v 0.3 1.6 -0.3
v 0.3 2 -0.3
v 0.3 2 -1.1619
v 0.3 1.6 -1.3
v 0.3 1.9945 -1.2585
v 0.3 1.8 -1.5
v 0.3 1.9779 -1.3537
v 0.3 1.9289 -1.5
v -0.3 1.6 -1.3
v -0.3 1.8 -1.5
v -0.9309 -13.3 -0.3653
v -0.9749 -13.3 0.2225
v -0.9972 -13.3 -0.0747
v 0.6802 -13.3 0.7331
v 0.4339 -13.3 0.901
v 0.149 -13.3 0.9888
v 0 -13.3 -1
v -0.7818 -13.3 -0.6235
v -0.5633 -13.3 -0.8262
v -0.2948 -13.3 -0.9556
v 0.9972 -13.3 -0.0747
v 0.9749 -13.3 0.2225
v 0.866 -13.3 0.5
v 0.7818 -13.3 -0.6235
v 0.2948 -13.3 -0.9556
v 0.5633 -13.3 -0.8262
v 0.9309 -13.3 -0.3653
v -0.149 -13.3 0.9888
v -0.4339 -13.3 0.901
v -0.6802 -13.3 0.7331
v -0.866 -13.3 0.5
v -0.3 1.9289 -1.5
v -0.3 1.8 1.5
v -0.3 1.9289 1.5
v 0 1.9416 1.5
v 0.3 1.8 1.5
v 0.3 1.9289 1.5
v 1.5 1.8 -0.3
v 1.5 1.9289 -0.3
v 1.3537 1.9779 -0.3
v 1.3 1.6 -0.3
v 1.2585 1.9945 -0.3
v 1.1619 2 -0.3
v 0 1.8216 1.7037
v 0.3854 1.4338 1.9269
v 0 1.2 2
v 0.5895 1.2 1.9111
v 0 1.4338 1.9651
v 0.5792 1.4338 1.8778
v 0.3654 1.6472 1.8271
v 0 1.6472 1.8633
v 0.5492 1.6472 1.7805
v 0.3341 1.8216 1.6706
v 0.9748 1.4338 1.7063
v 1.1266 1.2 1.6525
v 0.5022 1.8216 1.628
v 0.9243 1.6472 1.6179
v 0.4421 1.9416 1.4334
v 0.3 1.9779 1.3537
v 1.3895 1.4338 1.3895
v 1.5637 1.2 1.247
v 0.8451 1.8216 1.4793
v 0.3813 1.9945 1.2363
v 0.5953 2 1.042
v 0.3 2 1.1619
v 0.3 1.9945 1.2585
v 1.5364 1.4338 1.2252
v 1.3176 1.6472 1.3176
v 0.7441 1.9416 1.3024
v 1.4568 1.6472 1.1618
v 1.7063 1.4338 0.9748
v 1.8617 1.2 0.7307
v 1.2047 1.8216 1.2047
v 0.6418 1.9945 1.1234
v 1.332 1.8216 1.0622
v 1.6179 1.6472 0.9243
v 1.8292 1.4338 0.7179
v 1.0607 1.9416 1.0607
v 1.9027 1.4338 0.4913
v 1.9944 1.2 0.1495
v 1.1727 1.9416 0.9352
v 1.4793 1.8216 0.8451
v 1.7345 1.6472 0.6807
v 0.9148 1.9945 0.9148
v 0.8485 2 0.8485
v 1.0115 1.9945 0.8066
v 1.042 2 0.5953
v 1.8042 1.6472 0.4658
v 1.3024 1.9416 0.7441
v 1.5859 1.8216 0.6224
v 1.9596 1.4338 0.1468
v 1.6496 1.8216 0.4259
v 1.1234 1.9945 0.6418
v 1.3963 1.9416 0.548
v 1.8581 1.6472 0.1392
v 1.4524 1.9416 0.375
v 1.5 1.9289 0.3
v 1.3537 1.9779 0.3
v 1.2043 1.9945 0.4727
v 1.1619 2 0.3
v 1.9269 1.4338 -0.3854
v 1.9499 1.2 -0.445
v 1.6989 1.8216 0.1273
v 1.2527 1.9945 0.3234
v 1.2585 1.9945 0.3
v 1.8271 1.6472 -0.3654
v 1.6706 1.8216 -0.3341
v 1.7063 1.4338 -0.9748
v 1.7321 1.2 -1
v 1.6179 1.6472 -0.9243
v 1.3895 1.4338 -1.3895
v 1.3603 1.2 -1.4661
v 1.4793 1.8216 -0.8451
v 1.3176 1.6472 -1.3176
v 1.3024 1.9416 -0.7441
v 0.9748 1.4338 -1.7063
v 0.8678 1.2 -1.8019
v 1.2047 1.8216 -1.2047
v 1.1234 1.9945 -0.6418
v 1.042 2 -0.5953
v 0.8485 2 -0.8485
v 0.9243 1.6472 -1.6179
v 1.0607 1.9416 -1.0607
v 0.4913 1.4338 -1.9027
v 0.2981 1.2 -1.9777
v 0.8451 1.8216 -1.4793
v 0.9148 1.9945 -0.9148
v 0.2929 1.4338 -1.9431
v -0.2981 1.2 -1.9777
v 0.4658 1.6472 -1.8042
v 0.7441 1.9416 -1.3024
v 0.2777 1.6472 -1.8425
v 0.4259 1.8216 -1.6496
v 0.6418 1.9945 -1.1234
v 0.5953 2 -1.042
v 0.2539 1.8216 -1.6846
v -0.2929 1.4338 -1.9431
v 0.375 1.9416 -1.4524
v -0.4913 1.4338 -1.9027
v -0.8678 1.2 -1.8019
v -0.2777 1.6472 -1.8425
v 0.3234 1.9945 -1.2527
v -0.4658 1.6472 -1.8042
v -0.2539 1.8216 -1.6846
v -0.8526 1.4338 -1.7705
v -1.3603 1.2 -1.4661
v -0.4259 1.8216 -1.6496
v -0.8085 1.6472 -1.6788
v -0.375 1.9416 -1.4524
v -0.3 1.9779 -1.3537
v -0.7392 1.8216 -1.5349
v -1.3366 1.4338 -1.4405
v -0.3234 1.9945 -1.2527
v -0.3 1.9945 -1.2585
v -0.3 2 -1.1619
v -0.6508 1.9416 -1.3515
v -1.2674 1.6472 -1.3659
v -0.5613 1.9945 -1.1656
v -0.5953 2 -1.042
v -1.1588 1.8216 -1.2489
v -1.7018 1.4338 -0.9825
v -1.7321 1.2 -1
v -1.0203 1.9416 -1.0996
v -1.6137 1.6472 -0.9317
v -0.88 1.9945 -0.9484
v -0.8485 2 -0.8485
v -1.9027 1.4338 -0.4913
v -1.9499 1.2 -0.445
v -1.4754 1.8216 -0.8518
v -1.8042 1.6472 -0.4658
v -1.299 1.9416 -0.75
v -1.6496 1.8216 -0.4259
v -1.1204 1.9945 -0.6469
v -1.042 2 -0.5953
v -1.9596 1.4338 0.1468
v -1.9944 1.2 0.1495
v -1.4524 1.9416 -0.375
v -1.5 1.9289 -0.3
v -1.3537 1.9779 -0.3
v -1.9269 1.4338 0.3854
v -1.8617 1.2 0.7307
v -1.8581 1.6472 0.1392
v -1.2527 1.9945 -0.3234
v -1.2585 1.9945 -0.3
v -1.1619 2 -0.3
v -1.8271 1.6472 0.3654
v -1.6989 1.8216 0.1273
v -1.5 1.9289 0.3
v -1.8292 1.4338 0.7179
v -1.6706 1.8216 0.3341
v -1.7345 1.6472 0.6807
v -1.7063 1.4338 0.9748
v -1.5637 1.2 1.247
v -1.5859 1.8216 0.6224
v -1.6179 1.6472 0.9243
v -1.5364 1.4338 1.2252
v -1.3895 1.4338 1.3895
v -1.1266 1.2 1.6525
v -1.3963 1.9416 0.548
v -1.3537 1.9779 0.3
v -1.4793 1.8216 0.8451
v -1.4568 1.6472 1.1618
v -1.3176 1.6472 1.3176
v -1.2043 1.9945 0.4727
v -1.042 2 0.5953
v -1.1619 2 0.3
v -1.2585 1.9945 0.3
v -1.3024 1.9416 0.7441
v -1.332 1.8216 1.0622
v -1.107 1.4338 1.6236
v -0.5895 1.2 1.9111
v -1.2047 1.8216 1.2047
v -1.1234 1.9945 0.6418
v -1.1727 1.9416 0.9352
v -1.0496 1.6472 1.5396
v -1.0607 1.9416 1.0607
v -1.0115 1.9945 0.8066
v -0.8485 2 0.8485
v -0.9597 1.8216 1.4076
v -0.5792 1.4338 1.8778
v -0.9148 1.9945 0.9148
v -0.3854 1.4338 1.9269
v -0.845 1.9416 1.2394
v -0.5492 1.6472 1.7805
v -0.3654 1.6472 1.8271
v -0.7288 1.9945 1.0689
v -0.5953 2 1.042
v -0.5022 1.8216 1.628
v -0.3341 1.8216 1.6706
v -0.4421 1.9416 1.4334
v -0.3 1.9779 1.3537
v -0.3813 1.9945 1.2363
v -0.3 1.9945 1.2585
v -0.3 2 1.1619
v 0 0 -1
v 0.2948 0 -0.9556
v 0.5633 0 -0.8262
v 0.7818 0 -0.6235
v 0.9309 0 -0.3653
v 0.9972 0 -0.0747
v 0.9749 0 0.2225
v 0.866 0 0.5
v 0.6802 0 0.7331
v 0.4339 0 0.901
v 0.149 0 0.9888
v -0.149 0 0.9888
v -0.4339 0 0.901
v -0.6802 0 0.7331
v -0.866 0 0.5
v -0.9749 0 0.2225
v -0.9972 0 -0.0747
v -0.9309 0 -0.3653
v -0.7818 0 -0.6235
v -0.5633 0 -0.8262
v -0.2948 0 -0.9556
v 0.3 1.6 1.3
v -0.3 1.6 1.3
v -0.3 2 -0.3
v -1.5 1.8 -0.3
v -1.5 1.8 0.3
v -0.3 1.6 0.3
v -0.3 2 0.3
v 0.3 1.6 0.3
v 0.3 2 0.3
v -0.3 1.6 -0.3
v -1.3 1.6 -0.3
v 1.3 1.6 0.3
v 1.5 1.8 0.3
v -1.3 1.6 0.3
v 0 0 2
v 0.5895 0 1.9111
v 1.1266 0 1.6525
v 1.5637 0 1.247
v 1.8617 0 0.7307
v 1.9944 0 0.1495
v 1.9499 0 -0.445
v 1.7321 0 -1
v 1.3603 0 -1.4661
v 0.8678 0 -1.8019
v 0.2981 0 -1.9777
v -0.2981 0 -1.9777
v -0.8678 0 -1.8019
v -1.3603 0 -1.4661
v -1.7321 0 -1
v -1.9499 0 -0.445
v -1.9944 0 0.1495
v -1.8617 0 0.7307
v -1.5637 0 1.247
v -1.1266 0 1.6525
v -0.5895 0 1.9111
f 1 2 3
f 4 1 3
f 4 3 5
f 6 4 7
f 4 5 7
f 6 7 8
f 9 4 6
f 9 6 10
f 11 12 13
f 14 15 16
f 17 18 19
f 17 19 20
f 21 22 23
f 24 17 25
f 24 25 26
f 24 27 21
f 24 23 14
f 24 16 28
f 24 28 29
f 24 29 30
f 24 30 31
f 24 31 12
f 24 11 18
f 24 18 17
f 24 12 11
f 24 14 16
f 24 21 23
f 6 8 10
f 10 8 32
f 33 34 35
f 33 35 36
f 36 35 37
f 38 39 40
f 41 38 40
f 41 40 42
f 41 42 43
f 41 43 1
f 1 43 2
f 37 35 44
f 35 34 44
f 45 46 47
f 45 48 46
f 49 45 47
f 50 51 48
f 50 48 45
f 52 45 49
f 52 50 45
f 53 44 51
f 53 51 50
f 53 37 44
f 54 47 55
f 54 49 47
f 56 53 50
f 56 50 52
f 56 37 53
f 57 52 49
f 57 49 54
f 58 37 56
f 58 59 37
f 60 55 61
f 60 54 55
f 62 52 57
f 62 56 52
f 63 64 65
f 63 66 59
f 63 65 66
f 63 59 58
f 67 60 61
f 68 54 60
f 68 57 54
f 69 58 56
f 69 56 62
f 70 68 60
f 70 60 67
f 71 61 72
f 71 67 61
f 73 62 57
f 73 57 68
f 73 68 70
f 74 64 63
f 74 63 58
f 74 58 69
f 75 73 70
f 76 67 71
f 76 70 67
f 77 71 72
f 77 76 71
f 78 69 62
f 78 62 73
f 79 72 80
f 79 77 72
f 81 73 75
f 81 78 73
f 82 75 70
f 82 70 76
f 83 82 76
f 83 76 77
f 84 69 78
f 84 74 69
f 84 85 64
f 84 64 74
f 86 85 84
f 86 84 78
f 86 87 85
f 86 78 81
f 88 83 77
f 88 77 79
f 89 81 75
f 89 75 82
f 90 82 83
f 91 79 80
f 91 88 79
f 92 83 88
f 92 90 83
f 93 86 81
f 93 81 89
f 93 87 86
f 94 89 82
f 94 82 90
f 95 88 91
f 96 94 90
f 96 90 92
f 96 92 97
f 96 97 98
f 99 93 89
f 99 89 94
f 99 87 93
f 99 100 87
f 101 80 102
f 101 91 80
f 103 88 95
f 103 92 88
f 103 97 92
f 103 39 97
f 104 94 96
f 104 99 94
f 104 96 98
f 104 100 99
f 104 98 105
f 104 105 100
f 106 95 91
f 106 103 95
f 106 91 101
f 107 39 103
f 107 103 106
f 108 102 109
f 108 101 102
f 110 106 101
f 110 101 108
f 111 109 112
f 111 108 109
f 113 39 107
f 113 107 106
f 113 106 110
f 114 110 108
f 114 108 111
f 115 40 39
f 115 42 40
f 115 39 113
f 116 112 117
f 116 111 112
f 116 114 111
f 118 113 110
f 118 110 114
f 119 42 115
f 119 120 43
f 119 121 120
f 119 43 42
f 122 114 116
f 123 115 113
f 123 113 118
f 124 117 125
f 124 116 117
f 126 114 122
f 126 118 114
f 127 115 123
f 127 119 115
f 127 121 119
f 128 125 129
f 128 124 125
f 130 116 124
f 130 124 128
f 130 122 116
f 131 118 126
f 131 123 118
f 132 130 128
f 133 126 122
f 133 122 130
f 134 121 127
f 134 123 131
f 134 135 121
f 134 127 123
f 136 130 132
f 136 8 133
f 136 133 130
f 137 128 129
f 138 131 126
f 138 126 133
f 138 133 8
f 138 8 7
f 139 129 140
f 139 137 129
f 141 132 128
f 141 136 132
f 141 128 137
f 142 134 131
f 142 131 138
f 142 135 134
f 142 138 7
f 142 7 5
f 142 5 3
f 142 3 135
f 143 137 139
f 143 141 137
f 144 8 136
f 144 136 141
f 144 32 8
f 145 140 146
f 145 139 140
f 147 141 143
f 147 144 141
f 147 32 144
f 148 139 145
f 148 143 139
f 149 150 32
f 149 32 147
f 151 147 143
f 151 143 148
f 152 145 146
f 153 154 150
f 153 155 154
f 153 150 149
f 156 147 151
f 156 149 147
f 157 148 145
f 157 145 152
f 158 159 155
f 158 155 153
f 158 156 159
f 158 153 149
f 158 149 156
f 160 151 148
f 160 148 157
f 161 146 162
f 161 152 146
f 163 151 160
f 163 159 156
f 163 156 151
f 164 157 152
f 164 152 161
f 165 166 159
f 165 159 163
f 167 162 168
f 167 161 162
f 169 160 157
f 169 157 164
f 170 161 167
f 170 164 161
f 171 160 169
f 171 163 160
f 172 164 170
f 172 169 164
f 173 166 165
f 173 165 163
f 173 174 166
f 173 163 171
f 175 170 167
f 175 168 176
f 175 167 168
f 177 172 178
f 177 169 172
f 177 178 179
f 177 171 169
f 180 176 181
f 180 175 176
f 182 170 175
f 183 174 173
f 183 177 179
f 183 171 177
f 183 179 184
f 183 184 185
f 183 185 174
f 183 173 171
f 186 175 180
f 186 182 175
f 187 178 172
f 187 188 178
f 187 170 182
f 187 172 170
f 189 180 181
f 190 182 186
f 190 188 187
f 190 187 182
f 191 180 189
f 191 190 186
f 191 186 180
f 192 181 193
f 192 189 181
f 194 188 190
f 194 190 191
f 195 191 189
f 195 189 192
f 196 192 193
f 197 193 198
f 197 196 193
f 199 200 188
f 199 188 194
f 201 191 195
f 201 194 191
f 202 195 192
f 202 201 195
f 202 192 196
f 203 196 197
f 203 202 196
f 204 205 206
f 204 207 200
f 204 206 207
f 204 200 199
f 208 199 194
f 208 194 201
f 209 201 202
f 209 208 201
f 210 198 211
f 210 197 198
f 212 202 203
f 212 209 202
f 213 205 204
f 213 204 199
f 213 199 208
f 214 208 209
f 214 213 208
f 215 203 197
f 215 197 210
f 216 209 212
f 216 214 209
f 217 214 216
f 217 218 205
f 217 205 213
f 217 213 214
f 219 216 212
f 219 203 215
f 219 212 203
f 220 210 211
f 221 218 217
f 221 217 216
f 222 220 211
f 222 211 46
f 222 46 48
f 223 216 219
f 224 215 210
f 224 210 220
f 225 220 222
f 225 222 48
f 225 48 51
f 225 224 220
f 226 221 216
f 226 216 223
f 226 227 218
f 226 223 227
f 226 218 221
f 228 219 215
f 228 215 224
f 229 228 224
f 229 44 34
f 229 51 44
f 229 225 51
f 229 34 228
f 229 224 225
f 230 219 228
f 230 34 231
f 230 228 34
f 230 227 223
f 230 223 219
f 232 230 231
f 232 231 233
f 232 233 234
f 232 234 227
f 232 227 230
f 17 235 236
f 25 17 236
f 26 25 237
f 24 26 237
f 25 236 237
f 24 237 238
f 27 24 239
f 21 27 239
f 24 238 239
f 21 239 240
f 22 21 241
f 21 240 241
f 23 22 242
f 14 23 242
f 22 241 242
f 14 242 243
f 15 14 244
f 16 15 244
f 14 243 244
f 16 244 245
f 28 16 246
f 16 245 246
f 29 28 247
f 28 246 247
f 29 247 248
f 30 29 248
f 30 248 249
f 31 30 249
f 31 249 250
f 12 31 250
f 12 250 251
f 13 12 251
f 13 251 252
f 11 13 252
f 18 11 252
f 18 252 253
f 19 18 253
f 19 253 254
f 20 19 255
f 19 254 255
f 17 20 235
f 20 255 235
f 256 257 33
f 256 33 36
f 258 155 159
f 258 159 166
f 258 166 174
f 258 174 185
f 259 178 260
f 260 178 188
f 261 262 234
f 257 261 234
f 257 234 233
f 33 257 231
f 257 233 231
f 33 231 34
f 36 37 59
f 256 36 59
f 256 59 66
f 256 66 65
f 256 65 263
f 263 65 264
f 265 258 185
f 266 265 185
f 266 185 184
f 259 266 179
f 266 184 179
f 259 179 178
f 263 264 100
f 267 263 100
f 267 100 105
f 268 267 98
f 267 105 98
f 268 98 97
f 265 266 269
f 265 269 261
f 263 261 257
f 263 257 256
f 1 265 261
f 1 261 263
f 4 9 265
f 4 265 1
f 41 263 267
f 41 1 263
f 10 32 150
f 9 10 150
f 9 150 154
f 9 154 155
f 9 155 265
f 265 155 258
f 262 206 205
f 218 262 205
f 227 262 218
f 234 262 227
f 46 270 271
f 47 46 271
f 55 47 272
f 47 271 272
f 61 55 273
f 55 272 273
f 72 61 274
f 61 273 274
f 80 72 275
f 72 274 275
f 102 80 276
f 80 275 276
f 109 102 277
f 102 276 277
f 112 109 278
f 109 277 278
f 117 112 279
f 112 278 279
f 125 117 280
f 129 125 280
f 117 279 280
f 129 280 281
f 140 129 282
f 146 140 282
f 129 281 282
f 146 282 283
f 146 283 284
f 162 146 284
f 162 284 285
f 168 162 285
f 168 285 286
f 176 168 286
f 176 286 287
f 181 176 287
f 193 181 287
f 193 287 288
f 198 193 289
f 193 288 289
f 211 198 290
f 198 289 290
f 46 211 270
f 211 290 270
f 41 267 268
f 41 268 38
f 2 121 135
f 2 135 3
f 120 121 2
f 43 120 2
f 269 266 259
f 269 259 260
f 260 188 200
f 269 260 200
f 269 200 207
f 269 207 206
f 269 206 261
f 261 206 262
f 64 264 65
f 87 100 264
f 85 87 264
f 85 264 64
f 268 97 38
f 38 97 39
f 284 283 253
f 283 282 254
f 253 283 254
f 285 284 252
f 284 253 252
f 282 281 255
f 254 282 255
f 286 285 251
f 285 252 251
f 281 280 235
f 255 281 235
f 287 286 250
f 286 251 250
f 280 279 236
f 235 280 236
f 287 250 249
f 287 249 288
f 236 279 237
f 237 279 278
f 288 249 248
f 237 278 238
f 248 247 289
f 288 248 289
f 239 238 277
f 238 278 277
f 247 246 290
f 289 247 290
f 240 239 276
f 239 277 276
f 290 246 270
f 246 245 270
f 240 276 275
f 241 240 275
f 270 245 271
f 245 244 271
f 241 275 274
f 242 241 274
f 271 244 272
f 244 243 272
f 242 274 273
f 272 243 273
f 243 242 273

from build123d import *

# Parameters (mm, degrees)
SKETCH1_R           = 2
BOSS_EXTRUDE1_DEPTH = 2
FILLET1_R           = 0.8
SKETCH2_W           = 0.6
SKETCH2_H           = 0.6
CUT_EXTRUDE1_DEPTH  = 0.4
CHAMFER1_SIZE       = 0.2
SKETCH3_R           = 1
BOSS_EXTRUDE2_DEPTH = 13.3


with BuildPart() as part:
    # Sketch1 → Boss-Extrude1 (new body)
    with BuildSketch(Plane(origin=(0, 0, 0), x_dir=(1, 0, 0), z_dir=(0, 1, 0))):
        with Locations(Location((0, 0, 0), (0, 0, 270))):
            Circle(SKETCH1_R)
    extrude(amount=BOSS_EXTRUDE1_DEPTH)

    # Fillet1
    fillet1_edges = [part.edges().sort_by_distance(p)[0] for p in [
        (0, 2, -2),
    ]]
    fillet(fillet1_edges, radius=FILLET1_R)

    # Sketch2 → Cut-Extrude1 (cut)
    with BuildSketch(Plane(origin=(0, 2, 0), x_dir=(1, 0, 0), z_dir=(0, 1, 0))):
        with BuildLine():
            Line((-0.3, 0.3), (-1.161895004, 0.3))
            ThreePointArc((-1.161895004, 0.3), (-1.2, 0), (-1.161895004, -0.3))
            Line((-1.161895004, -0.3), (-0.3, -0.3))
            Line((-0.3, -0.3), (-0.3, 0.3))
        make_face()
        with BuildLine():
            Line((-0.3, 1.161895004), (-0.3, 0.3))
            Line((-0.3, 0.3), (0.3, 0.3))
            Line((0.3, 0.3), (0.3, 1.161895004))
            ThreePointArc((0.3, 1.161895004), (0, 1.2), (-0.3, 1.161895004))
        make_face()
        with BuildLine():
            Line((-1.161895004, 0.3), (-1.5, 0.3))
            Line((-1.5, 0.3), (-1.5, -0.3))
            Line((-1.5, -0.3), (-1.161895004, -0.3))
            ThreePointArc((-1.161895004, -0.3), (-1.2, 0), (-1.161895004, 0.3))
        make_face()
        with BuildLine():
            Line((-0.3, 1.5), (-0.3, 1.161895004))
            ThreePointArc((-0.3, 1.161895004), (0, 1.2), (0.3, 1.161895004))
            Line((0.3, 1.161895004), (0.3, 1.5))
            Line((0.3, 1.5), (-0.3, 1.5))
        make_face()
        with BuildLine():
            Line((1.161895004, 0.3), (0.3, 0.3))
            Line((0.3, 0.3), (0.3, -0.3))
            Line((0.3, -0.3), (1.161895004, -0.3))
            ThreePointArc((1.161895004, -0.3), (1.190435636, -0.151205151), (1.2, 0))
            ThreePointArc((1.2, 0), (1.190435636, 0.151205151), (1.161895004, 0.3))
        make_face()
        with BuildLine():
            Line((1.5, 0.3), (1.161895004, 0.3))
            ThreePointArc((1.161895004, 0.3), (1.190435636, 0.151205151), (1.2, 0))
            ThreePointArc((1.2, 0), (1.190435636, -0.151205151), (1.161895004, -0.3))
            Line((1.161895004, -0.3), (1.5, -0.3))
            Line((1.5, -0.3), (1.5, 0.3))
        make_face()
        Rectangle(SKETCH2_W, SKETCH2_H)
        with BuildLine():
            Line((0.3, -0.3), (-0.3, -0.3))
            Line((-0.3, -0.3), (-0.3, -1.161895004))
            ThreePointArc((-0.3, -1.161895004), (0, -1.2), (0.3, -1.161895004))
            Line((0.3, -1.161895004), (0.3, -0.3))
        make_face()
        with BuildLine():
            ThreePointArc((0.3, -1.161895004), (0, -1.2), (-0.3, -1.161895004))
            Line((-0.3, -1.161895004), (-0.3, -1.5))
            Line((-0.3, -1.5), (0.3, -1.5))
            Line((0.3, -1.5), (0.3, -1.161895004))
        make_face()
    extrude(amount=-CUT_EXTRUDE1_DEPTH, mode=Mode.SUBTRACT)

    # Chamfer1
    chamfer1_edges = [part.edges().sort_by_distance(p)[0] for p in [
        (-1.5, 1.6, 0),
        (0, 1.6, 1.5),
        (0, 1.6, -1.5),
        (1.5, 1.6, 0),
    ]]
    chamfer(chamfer1_edges, length=CHAMFER1_SIZE)

    # Sketch3 → Boss-Extrude2 (add)
    with BuildSketch(Plane.XZ):
        with Locations(Location((0, 0, 0), (0, 0, 270))):
            Circle(SKETCH3_R)
    extrude(amount=BOSS_EXTRUDE2_DEPTH)


solid = part.part
